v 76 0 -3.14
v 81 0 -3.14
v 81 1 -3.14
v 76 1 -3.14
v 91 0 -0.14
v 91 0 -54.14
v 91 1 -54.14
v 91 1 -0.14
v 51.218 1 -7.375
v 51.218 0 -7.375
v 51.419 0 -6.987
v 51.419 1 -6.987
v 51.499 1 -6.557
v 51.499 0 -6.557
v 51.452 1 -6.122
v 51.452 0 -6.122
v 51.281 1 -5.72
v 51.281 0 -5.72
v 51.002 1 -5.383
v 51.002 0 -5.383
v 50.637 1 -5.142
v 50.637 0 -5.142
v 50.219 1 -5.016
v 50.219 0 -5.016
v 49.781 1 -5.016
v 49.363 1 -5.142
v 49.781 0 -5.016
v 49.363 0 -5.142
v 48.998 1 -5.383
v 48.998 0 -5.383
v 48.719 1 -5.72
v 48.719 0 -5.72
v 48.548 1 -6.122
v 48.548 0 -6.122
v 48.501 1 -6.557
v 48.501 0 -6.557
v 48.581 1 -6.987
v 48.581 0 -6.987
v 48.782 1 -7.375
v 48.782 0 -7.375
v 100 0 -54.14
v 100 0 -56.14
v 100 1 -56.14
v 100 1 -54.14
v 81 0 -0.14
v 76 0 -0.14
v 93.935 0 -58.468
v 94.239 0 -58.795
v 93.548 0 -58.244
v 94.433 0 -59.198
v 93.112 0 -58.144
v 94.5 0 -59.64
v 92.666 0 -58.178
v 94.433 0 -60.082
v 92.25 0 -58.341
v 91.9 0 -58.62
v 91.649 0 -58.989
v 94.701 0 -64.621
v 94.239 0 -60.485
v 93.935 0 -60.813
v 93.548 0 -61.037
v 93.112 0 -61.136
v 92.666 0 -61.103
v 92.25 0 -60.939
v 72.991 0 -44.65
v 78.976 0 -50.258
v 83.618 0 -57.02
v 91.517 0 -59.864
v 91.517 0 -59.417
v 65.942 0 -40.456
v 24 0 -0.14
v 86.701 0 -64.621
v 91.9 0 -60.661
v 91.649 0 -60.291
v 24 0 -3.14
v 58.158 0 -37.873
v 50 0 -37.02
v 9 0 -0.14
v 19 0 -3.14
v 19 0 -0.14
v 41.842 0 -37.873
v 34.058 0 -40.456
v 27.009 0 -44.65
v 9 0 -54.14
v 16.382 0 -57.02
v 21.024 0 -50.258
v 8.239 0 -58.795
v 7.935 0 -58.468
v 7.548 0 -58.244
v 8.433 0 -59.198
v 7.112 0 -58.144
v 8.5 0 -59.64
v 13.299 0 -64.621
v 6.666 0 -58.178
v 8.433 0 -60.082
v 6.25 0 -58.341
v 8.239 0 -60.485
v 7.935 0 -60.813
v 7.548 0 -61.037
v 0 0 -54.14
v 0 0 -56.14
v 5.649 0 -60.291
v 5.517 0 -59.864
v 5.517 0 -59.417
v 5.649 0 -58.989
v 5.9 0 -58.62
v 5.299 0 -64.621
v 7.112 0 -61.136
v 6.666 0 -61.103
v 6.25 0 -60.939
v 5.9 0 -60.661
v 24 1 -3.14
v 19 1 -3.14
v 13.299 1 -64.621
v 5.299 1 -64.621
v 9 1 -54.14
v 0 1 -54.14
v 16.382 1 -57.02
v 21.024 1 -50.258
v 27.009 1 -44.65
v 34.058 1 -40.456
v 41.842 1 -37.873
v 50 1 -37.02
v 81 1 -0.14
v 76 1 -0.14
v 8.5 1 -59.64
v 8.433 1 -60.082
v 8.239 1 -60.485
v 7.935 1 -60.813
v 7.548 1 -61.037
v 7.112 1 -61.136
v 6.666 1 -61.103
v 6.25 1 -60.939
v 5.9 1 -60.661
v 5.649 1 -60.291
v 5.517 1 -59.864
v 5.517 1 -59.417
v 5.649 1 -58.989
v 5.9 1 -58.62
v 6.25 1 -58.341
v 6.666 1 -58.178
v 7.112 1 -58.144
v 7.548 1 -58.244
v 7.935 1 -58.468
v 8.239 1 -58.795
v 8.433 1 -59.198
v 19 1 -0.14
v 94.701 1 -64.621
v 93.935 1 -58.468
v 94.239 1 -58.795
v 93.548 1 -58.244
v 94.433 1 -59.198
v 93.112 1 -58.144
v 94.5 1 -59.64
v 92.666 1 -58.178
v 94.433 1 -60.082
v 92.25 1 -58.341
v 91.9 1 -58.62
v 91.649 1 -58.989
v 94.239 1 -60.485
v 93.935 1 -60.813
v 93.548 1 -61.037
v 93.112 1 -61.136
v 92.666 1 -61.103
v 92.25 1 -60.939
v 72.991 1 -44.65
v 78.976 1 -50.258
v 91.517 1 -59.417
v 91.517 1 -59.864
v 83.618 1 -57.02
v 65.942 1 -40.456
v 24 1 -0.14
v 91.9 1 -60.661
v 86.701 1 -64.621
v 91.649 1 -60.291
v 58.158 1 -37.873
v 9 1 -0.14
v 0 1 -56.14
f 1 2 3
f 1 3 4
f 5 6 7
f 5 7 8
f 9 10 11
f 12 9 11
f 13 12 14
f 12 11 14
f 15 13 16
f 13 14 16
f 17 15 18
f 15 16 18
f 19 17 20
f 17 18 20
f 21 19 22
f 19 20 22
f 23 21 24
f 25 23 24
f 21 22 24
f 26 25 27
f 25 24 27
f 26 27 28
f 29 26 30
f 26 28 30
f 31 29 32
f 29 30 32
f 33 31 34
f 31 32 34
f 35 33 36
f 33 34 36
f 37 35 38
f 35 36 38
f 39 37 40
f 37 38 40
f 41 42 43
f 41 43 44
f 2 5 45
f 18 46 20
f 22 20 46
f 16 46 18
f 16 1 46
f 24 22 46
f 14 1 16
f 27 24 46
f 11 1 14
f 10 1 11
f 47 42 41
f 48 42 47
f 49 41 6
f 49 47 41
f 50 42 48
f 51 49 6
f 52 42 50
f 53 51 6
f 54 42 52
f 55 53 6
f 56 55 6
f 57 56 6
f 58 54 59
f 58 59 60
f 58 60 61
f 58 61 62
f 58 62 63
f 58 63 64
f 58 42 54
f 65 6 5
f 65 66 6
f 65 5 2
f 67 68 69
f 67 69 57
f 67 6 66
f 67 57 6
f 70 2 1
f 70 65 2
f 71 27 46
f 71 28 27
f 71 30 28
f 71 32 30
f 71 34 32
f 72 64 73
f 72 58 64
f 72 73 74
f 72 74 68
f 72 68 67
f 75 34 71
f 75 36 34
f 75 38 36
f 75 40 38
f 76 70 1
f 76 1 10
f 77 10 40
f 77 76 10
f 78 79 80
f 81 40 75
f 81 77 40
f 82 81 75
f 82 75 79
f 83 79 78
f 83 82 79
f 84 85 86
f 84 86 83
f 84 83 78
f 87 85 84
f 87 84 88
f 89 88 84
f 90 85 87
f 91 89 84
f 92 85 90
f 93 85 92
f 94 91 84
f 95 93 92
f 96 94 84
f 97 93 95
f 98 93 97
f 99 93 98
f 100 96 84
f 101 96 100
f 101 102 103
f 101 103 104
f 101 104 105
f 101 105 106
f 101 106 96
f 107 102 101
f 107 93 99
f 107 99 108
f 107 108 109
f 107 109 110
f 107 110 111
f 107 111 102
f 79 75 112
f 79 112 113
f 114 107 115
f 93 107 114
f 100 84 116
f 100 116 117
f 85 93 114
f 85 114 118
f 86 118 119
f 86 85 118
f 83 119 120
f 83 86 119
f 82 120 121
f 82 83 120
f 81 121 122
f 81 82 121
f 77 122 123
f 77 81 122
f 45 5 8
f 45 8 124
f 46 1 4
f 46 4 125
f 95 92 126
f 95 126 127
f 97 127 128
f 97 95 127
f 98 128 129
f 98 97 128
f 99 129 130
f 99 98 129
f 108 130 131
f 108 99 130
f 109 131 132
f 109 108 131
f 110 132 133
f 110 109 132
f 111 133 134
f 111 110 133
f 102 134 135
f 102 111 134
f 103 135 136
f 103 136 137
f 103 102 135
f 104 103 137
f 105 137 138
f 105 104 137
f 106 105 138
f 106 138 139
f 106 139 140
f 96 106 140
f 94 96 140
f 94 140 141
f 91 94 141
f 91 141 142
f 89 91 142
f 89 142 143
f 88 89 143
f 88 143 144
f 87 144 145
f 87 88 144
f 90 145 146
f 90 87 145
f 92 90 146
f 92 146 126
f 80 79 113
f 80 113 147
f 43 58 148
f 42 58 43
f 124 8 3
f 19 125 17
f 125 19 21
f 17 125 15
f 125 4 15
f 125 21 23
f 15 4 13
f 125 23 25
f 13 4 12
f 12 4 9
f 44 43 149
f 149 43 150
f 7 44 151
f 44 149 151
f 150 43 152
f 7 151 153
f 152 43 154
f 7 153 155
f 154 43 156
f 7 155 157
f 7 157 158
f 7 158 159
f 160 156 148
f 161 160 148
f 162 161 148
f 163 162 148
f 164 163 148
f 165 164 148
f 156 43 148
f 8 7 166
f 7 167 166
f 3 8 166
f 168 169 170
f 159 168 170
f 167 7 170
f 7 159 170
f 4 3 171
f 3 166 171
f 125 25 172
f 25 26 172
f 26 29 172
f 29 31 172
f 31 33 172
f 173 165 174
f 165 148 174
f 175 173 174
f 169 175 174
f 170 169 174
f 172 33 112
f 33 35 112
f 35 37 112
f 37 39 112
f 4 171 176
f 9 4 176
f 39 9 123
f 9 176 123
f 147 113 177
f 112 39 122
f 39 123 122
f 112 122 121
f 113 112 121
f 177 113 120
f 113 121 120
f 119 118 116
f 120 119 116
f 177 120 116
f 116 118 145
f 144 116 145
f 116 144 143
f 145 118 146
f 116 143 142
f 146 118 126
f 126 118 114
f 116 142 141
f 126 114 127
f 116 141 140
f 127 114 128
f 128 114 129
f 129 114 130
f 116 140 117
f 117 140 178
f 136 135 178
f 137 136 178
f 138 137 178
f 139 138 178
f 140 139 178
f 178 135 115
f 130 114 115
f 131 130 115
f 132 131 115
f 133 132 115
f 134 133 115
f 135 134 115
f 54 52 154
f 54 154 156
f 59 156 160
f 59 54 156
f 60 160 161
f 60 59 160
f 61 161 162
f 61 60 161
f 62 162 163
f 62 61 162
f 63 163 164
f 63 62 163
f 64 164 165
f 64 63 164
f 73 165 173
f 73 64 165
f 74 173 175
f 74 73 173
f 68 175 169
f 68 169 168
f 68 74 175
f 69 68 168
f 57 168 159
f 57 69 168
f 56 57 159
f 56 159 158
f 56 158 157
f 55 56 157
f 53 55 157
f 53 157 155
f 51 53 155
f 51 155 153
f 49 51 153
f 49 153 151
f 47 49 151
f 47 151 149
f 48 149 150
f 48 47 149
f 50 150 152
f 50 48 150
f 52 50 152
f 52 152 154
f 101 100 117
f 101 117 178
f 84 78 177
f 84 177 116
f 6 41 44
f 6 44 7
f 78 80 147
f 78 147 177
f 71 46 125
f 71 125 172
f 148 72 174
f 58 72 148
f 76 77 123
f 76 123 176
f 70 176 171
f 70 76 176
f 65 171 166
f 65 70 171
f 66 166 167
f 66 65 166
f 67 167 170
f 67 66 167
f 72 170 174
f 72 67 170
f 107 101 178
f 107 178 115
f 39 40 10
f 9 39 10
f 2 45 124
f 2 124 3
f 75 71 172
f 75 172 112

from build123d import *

# Parameters (mm, degrees)
BASE_R                   = 1.5
RESSALTO_EXTRUS_O1_DEPTH = 1


with BuildPart() as part:
    # Base → Ressalto-extrusão1 (new body)
    with BuildSketch(Plane(origin=(0, 0, 0), x_dir=(1, 0, 0), z_dir=(0, 1, 0))):
        with BuildLine():
            Line((0, 56.140303816), (5.299192642, 64.620784778))
            Line((5.299192642, 64.620784778), (13.299192642, 64.620784778))
            ThreePointArc((13.299192642, 64.620784778), (27.008925086, 44.649768212), (50, 37.020302921))
            ThreePointArc((50, 37.020302921), (72.991074914, 44.649768212), (86.700807358, 64.620784778))
            Line((86.700807358, 64.620784778), (94.700807358, 64.620784778))
            Line((94.700807358, 64.620784778), (100, 56.140303816))
            Line((100, 56.140303816), (100, 54.140303816))
            Line((100, 54.140303816), (91, 54.140303816))
            Line((91, 54.140303816), (91, 0.140303816))
            Line((91, 0.140303816), (81, 0.140303816))
            Line((81, 0.140303816), (81, 3.140303816))
            Line((81, 3.140303816), (76, 3.140303816))
            Line((76, 3.140303816), (76, 0.140303816))
            Line((76, 0.140303816), (24, 0.140303816))
            Line((24, 0.140303816), (24, 3.140303816))
            Line((24, 3.140303816), (19, 3.140303816))
            Line((19, 3.140303816), (19, 0.140303816))
            Line((19, 0.140303816), (9, 0.140303816))
            Line((9, 0.140303816), (9, 54.140303816))
            Line((9, 54.140303816), (0, 54.140303816))
            Line((0, 54.140303816), (0, 56.140303816))
        make_face()
        with Locations((7, 59.640303816)):
            Circle(BASE_R, mode=Mode.SUBTRACT)
        with Locations((93, 59.640303816)):
            Circle(BASE_R, mode=Mode.SUBTRACT)
        with BuildLine():
            Line((48.781650707, 7.375), (51.218349293, 7.375))
            ThreePointArc((51.218349293, 7.375), (50, 5), (48.781650707, 7.375))
        make_face(mode=Mode.SUBTRACT)
    extrude(amount=RESSALTO_EXTRUS_O1_DEPTH)


solid = part.part
